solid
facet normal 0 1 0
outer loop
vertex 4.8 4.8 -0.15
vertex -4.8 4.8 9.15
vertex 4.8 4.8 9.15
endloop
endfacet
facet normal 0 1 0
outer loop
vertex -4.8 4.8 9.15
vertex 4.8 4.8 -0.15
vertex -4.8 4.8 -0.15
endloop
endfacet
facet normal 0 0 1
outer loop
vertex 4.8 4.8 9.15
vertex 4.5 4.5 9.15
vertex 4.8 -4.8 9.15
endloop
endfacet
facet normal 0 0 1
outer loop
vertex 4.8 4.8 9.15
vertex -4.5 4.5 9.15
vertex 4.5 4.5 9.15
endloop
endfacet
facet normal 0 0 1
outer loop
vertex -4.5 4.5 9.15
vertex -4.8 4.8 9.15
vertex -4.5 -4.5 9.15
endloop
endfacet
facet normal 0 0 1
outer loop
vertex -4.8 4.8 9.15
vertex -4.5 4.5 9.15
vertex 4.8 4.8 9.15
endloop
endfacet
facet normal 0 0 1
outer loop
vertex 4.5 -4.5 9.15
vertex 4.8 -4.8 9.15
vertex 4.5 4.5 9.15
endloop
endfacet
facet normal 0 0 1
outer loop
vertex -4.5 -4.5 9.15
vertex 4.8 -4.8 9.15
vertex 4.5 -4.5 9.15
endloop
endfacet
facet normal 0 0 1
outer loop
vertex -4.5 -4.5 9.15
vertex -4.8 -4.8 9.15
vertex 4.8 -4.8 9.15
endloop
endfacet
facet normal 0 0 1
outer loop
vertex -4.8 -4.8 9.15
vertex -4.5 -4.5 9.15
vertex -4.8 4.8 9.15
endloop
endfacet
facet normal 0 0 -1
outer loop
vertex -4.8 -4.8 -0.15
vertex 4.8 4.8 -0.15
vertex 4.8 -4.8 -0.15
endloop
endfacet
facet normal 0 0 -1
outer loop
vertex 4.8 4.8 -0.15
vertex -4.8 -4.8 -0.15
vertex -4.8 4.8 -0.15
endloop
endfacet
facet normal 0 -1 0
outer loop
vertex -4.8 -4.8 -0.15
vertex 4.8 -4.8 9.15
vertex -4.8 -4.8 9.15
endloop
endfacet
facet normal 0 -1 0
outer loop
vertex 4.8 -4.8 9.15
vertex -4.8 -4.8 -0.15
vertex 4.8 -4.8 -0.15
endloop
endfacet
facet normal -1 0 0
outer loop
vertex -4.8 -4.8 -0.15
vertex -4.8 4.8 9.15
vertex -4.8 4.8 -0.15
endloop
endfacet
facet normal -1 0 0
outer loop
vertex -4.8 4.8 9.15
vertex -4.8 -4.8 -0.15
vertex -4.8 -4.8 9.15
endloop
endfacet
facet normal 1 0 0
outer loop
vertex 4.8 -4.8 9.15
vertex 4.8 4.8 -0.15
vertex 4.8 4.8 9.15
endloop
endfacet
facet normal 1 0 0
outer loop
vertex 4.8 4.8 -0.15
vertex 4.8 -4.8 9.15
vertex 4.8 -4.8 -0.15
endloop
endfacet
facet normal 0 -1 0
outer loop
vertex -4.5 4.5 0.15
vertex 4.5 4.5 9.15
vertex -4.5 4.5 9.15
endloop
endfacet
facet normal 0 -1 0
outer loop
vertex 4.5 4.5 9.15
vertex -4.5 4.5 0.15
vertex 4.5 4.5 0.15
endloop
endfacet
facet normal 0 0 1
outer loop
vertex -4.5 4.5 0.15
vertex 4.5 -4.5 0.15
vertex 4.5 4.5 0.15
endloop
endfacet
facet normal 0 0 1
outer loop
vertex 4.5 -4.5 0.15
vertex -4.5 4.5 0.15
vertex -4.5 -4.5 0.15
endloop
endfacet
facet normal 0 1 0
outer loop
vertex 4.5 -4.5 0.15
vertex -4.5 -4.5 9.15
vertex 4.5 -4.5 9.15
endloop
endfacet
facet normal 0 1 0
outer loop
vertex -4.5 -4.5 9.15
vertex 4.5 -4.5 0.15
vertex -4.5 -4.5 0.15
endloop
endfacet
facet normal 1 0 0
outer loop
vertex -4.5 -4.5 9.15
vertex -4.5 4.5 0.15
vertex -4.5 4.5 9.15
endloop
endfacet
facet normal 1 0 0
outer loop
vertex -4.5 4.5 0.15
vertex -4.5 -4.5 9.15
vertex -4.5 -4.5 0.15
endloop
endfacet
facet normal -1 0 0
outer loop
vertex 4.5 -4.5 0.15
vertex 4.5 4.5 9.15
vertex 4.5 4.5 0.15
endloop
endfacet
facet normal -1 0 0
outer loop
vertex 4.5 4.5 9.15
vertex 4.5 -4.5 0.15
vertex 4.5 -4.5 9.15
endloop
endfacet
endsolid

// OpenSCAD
//Scalable Soma Cube, by Alejandro Erickson
//Derived from: http://www.thingiverse.com/thing:3784 and http://www.thingiverse.com/thing:11644


//Size of Unit Cubes in mm.  Perhaps unit-shaveMM should be a multiple of your z-layer height
unit = 3; 

//Amount to shave off (inset) each piece.  Compensates for small print size.
shaveMM=.15;

//Box thickness (for the containing box)
boxThickness = .3;

part = "box";//[corner,ess,tee,rightsnake,leftsnake,angle,ell,all,box,lid]

module somaBox(){
render() 
	translate([0,0,0.5*(3*unit+boxThickness)]) difference(){
  		cube(size=[3*unit+2*boxThickness,3*unit+2*boxThickness, 3*unit+boxThickness],center=true);	
  		translate([0,0,boxThickness*0.5]) cube(size=3*unit, center= true);
	}
}

module somaLid(){
	render() translate([0,0, 1.5*boxThickness]) difference(){
		cube(size=[3*unit+4*boxThickness+shaveMM, 3*unit+4*boxThickness+shaveMM, 3*boxThickness],center=true);
		translate([0,0,0.5*boxThickness]) cube(size=[3*unit+2*boxThickness+shaveMM, 3*unit+2*boxThickness+shaveMM, 2*boxThickness],center=true);

}
}

module c()
{
	cube(size=unit, center=true);
}



module bigC()
{
	cube(size=100*unit, center=true);
}

module Shave(){
  for (i = [0 : $children-1])	{
	minkowski(){
	difference(){
		bigC(); 
		minkowski(){
			difference(){ 
				bigC(); 
				child(i);
			} 
			cube(size=2*shaveMM, center=true);
		}
	}
	}	
}
}


module c1()
{
  translate([0,0,0.5*unit]) Shave() rotate(180,[0,0,1])  union()
  {
    c();
    translate([unit,0,0]) c();
    translate([unit,unit,0]) c();
    translate([unit,0,unit]) c();
  }
}



module c2()
{
translate([0,0,1.5*unit])  //angle
Shave() rotate(180,[0,0,1]) rotate(90,[0,1,0]) union()
  {
    c();
    translate([unit,0,0]) c();
    translate([unit,unit,0]) c();
  }
}


module c3()
{
translate([0,0,0.5*unit])  //ess
  Shave() rotate(180,[1,0,0]) rotate(90,[0,0,1])  union()
  {
    c();
    translate([unit,0,0]) c();
    translate([unit,unit,0]) c();
    translate([2*unit,unit,0]) c();
  }
}


module c4()
{translate([0,0,0.5*unit])
  Shave() rotate(90,[1,0,0])  union()
  {
    c();
    translate([unit,0,0]) c();
    translate([unit,unit,0]) c();
    translate([2*unit,0,0]) c();
  }
}


module c5()
{translate([0,0,0.5*unit])
  Shave() rotate(180,[0,0,1]) union()
  {
    c();
    translate([unit,0,0]) c();
    translate([unit,unit,0]) c();
    translate([unit,unit,unit]) c();
  }
}


module c6()
{translate([0,0,0.5*unit])
  Shave() union()
  {
    c();
    translate([unit,0,0]) c();
    translate([unit,unit,0]) c();
    translate([0,0,unit]) c();
  }
}


module c7()
{
translate([0,0,2.5*unit])
  Shave() rotate(90,[0,1,0])  union()
  {
    c();
    translate([unit,0,0]) c();
    translate([2*unit,unit,0]) c();
    translate([2*unit,0,0]) c();
  }
}

translate([0,0,-shaveMM])
scale(1) rotate(90,[0,0,1])
{
if(part == "all"){
translate([-2*unit,5*unit,0])  c1(); //corner
translate([-2*unit,2*unit,0]) c3(); //ess
translate([0*unit,0*unit,0]) c4(); //tee
translate([0*unit,2*unit,0]) c6(); //rightsnake
translate([1*unit,6*unit,0]) c5(); //leftsnake
translate([3*unit,3*unit,0]) c2(); //angle
translate([3*unit,5*unit,0]) c7(); //ell
}
else if(part == "corner") c1();
else if(part == "ess") c2();
else if(part == "tee") c3();
else if(part == "leftsnake") c4();
else if(part == "rightsnake") c5();
else if(part == "angle") c6();
else if(part == "ell") c7();
else if(part == "box") somaBox();
else if(part == "lid") somaLid();
}
